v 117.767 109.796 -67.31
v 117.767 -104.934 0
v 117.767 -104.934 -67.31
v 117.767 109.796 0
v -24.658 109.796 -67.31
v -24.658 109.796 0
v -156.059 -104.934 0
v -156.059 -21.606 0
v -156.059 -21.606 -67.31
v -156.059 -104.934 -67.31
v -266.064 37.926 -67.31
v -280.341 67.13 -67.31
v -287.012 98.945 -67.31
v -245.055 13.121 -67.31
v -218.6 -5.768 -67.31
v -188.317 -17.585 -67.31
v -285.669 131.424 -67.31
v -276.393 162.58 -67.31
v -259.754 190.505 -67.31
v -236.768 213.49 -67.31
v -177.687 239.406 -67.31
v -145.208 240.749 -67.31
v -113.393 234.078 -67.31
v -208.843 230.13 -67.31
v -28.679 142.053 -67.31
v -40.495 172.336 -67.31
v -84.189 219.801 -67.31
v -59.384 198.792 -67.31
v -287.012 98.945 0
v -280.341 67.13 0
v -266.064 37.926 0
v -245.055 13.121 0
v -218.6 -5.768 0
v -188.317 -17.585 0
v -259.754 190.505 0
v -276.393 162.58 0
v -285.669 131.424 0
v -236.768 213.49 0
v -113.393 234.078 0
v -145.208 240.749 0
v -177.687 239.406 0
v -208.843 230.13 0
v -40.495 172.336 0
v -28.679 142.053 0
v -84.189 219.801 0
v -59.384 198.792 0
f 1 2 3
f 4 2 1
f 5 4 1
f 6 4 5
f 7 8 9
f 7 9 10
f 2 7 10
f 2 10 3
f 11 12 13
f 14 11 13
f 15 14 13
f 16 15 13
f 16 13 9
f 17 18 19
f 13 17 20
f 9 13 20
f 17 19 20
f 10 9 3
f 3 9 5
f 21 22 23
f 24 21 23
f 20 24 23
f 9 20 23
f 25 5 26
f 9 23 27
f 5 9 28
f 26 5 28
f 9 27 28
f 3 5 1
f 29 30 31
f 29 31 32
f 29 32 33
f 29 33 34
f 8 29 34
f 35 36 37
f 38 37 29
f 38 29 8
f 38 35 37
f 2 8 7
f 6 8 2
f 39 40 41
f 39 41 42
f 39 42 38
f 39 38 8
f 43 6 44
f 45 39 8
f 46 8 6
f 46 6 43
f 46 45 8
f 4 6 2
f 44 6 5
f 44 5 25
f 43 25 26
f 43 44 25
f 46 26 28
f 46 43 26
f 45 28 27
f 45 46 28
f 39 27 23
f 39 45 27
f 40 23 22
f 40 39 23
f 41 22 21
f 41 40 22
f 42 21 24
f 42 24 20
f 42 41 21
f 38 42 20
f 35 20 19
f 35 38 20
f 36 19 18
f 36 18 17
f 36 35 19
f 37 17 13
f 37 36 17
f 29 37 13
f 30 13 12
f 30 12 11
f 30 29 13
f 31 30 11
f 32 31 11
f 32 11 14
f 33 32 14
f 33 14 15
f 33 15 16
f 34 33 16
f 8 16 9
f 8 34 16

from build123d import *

# Parameters (mm, degrees)
F1_DEPTH = 67.31


with BuildPart() as f1:
    # F0 (on Top) → F1 (new body)
    with BuildSketch(Plane.XY):
        with BuildLine():
            Line((-156.0593098402, -104.9341335893), (117.7671849728, -104.9341335893))
            Line((117.7671849728, -104.9341335893), (117.7671849728, 109.7960919142))
            Line((117.7671849728, 109.7960919142), (-24.6576875478, 109.7960919142))
            ThreePointArc((-24.6576875478, 109.7960919142), (-63.1443316583, 16.8811137323), (-156.0593098402, -21.6055303782))
            Line((-156.0593098402, -21.6055303782), (-156.0593098402, -104.9341335893))
        make_face()
        with BuildLine():
            ThreePointArc((-24.6576875478, 109.7960919142), (-248.9742880221, 202.7110700961), (-156.0593098402, -21.6055303782))
            Line((-156.0593098402, -21.6055303782), (-156.0593098402, 109.7960919142))
            Line((-156.0593098402, 109.7960919142), (-24.6576875478, 109.7960919142))
        make_face()
        with BuildLine():
            Line((-156.0593098402, 109.7960919142), (-156.0593098402, -21.6055303782))
            ThreePointArc((-156.0593098402, -21.6055303782), (-63.1443316583, 16.8811137323), (-24.6576875478, 109.7960919142))
            Line((-24.6576875478, 109.7960919142), (-156.0593098402, 109.7960919142))
        make_face()
    extrude(amount=-F1_DEPTH)


solid = f1.part
